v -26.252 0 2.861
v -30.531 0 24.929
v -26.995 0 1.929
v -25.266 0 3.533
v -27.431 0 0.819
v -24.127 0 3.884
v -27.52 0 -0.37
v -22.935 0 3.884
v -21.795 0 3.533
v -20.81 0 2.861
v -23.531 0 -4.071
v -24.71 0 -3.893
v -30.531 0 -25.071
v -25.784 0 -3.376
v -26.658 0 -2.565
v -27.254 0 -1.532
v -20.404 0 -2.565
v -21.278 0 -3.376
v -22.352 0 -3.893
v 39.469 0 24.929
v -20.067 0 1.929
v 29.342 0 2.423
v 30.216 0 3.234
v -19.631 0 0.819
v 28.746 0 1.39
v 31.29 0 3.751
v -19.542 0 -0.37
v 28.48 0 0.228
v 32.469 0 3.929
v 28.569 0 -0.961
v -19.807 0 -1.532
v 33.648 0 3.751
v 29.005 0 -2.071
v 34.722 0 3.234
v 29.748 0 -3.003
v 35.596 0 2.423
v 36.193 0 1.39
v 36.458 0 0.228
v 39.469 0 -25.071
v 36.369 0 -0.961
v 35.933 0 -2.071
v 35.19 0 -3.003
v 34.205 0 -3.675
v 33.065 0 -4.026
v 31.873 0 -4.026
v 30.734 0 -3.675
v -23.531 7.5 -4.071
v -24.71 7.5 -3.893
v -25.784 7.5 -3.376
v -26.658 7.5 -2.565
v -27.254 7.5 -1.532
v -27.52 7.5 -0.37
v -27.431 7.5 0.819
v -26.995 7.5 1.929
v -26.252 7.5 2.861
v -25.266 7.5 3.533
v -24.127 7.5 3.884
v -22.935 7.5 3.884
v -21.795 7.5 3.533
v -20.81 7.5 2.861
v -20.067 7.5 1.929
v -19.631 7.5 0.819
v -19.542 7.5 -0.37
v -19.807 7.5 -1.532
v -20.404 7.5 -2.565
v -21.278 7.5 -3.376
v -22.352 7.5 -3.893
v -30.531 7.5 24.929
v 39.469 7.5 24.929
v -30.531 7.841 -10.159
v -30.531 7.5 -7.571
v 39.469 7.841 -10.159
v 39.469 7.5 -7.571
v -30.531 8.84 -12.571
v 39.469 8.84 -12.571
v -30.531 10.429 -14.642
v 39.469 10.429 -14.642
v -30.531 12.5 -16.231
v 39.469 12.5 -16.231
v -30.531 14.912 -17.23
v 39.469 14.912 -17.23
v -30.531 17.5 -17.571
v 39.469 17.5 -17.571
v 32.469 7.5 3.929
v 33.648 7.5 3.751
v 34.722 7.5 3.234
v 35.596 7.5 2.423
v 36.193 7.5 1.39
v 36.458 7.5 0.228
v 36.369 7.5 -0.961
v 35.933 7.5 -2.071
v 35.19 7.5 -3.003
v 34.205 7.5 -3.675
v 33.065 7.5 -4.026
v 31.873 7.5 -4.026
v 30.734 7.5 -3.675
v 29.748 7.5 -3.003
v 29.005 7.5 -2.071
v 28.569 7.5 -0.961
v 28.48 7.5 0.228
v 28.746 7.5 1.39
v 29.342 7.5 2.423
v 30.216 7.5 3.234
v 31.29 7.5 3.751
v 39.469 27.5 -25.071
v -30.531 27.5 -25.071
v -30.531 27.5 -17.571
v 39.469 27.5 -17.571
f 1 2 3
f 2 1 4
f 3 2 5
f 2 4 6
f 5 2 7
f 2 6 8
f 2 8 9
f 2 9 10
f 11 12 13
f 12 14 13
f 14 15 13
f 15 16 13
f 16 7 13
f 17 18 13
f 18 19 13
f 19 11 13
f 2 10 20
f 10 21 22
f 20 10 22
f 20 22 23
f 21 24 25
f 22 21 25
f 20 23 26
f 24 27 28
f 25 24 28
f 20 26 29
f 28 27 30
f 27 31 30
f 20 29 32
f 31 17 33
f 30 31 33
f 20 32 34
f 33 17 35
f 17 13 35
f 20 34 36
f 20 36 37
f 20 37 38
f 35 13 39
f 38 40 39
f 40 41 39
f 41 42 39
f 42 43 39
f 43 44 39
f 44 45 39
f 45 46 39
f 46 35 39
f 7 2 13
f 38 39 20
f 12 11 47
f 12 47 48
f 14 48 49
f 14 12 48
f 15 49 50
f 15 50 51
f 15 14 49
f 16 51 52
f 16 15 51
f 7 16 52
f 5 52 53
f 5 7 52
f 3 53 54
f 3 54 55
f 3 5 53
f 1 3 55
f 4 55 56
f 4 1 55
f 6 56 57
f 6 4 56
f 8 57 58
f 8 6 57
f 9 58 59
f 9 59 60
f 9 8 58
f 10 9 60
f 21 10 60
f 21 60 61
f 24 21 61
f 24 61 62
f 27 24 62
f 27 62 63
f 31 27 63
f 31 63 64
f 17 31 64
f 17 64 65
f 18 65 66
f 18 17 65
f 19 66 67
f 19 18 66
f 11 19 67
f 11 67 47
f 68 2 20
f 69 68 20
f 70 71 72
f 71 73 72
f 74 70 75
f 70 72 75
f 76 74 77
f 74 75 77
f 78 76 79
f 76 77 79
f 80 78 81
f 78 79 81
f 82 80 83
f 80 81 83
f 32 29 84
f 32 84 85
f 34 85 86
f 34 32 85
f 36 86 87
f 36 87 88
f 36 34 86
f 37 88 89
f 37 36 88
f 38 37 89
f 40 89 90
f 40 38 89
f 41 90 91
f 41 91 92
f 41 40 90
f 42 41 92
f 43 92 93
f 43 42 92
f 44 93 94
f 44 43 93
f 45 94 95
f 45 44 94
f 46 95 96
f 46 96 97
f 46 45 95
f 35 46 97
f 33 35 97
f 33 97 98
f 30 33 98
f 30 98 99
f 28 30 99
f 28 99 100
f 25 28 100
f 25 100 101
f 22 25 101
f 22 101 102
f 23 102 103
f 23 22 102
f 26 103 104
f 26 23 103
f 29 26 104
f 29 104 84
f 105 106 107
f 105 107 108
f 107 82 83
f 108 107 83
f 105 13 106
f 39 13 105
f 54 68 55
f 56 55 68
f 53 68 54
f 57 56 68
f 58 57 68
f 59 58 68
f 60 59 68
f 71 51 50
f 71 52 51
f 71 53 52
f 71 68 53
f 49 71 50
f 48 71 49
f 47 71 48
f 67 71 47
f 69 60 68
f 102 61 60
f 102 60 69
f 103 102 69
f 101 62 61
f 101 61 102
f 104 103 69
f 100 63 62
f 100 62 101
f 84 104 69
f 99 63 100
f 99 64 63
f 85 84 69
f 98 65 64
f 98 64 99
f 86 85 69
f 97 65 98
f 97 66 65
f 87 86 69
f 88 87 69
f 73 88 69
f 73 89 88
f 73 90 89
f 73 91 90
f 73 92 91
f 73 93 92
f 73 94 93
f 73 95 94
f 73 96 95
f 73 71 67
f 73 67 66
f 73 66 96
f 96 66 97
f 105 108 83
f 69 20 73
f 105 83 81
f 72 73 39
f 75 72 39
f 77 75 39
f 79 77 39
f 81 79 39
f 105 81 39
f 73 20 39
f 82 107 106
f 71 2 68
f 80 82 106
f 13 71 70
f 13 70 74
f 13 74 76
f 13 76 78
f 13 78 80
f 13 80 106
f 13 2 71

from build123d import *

# Parameters (mm, degrees)
SKETCH3_W           = 70
SKETCH3_H           = 50
SKETCH3_R           = 4
BOSS_EXTRUDE1_DEPTH = 7.5
SKETCH4_W           = 70
SKETCH4_H           = 7.5
BOSS_EXTRUDE2_DEPTH = 20
FILLET3_R           = 10


with BuildPart() as part:
    # Sketch3 → Boss-Extrude1 (new body)
    with BuildSketch(Plane(origin=(0, 0, 0), x_dir=(1, 0, 0), z_dir=(0, 1, 0))):
        with Locations((4.469051839, 0.071060676)):
            Rectangle(SKETCH3_W, SKETCH3_H)
        with Locations(Location((32.469051839, 0.071060676, 0), (0, 0, 270))):
            Circle(SKETCH3_R, mode=Mode.SUBTRACT)
        with Locations(Location((-23.530948161, 0.071060676, 0), (0, 0, 90))):
            Circle(SKETCH3_R, mode=Mode.SUBTRACT)
    extrude(amount=BOSS_EXTRUDE1_DEPTH)

    # Sketch4 → Boss-Extrude2 (add)
    with BuildSketch(Plane(origin=(0, 7.5, 0), x_dir=(1, 0, 0), z_dir=(0, 1, 0))):
        with Locations((4.469051839, 21.321060676)):
            Rectangle(SKETCH4_W, SKETCH4_H)
    extrude(amount=BOSS_EXTRUDE2_DEPTH)

    # Fillet3
    fillet3_edges = [part.edges().sort_by_distance(p)[0] for p in [
        (4.469051839, 7.5, -17.571060676),
    ]]
    fillet(fillet3_edges, radius=FILLET3_R)


solid = part.part
